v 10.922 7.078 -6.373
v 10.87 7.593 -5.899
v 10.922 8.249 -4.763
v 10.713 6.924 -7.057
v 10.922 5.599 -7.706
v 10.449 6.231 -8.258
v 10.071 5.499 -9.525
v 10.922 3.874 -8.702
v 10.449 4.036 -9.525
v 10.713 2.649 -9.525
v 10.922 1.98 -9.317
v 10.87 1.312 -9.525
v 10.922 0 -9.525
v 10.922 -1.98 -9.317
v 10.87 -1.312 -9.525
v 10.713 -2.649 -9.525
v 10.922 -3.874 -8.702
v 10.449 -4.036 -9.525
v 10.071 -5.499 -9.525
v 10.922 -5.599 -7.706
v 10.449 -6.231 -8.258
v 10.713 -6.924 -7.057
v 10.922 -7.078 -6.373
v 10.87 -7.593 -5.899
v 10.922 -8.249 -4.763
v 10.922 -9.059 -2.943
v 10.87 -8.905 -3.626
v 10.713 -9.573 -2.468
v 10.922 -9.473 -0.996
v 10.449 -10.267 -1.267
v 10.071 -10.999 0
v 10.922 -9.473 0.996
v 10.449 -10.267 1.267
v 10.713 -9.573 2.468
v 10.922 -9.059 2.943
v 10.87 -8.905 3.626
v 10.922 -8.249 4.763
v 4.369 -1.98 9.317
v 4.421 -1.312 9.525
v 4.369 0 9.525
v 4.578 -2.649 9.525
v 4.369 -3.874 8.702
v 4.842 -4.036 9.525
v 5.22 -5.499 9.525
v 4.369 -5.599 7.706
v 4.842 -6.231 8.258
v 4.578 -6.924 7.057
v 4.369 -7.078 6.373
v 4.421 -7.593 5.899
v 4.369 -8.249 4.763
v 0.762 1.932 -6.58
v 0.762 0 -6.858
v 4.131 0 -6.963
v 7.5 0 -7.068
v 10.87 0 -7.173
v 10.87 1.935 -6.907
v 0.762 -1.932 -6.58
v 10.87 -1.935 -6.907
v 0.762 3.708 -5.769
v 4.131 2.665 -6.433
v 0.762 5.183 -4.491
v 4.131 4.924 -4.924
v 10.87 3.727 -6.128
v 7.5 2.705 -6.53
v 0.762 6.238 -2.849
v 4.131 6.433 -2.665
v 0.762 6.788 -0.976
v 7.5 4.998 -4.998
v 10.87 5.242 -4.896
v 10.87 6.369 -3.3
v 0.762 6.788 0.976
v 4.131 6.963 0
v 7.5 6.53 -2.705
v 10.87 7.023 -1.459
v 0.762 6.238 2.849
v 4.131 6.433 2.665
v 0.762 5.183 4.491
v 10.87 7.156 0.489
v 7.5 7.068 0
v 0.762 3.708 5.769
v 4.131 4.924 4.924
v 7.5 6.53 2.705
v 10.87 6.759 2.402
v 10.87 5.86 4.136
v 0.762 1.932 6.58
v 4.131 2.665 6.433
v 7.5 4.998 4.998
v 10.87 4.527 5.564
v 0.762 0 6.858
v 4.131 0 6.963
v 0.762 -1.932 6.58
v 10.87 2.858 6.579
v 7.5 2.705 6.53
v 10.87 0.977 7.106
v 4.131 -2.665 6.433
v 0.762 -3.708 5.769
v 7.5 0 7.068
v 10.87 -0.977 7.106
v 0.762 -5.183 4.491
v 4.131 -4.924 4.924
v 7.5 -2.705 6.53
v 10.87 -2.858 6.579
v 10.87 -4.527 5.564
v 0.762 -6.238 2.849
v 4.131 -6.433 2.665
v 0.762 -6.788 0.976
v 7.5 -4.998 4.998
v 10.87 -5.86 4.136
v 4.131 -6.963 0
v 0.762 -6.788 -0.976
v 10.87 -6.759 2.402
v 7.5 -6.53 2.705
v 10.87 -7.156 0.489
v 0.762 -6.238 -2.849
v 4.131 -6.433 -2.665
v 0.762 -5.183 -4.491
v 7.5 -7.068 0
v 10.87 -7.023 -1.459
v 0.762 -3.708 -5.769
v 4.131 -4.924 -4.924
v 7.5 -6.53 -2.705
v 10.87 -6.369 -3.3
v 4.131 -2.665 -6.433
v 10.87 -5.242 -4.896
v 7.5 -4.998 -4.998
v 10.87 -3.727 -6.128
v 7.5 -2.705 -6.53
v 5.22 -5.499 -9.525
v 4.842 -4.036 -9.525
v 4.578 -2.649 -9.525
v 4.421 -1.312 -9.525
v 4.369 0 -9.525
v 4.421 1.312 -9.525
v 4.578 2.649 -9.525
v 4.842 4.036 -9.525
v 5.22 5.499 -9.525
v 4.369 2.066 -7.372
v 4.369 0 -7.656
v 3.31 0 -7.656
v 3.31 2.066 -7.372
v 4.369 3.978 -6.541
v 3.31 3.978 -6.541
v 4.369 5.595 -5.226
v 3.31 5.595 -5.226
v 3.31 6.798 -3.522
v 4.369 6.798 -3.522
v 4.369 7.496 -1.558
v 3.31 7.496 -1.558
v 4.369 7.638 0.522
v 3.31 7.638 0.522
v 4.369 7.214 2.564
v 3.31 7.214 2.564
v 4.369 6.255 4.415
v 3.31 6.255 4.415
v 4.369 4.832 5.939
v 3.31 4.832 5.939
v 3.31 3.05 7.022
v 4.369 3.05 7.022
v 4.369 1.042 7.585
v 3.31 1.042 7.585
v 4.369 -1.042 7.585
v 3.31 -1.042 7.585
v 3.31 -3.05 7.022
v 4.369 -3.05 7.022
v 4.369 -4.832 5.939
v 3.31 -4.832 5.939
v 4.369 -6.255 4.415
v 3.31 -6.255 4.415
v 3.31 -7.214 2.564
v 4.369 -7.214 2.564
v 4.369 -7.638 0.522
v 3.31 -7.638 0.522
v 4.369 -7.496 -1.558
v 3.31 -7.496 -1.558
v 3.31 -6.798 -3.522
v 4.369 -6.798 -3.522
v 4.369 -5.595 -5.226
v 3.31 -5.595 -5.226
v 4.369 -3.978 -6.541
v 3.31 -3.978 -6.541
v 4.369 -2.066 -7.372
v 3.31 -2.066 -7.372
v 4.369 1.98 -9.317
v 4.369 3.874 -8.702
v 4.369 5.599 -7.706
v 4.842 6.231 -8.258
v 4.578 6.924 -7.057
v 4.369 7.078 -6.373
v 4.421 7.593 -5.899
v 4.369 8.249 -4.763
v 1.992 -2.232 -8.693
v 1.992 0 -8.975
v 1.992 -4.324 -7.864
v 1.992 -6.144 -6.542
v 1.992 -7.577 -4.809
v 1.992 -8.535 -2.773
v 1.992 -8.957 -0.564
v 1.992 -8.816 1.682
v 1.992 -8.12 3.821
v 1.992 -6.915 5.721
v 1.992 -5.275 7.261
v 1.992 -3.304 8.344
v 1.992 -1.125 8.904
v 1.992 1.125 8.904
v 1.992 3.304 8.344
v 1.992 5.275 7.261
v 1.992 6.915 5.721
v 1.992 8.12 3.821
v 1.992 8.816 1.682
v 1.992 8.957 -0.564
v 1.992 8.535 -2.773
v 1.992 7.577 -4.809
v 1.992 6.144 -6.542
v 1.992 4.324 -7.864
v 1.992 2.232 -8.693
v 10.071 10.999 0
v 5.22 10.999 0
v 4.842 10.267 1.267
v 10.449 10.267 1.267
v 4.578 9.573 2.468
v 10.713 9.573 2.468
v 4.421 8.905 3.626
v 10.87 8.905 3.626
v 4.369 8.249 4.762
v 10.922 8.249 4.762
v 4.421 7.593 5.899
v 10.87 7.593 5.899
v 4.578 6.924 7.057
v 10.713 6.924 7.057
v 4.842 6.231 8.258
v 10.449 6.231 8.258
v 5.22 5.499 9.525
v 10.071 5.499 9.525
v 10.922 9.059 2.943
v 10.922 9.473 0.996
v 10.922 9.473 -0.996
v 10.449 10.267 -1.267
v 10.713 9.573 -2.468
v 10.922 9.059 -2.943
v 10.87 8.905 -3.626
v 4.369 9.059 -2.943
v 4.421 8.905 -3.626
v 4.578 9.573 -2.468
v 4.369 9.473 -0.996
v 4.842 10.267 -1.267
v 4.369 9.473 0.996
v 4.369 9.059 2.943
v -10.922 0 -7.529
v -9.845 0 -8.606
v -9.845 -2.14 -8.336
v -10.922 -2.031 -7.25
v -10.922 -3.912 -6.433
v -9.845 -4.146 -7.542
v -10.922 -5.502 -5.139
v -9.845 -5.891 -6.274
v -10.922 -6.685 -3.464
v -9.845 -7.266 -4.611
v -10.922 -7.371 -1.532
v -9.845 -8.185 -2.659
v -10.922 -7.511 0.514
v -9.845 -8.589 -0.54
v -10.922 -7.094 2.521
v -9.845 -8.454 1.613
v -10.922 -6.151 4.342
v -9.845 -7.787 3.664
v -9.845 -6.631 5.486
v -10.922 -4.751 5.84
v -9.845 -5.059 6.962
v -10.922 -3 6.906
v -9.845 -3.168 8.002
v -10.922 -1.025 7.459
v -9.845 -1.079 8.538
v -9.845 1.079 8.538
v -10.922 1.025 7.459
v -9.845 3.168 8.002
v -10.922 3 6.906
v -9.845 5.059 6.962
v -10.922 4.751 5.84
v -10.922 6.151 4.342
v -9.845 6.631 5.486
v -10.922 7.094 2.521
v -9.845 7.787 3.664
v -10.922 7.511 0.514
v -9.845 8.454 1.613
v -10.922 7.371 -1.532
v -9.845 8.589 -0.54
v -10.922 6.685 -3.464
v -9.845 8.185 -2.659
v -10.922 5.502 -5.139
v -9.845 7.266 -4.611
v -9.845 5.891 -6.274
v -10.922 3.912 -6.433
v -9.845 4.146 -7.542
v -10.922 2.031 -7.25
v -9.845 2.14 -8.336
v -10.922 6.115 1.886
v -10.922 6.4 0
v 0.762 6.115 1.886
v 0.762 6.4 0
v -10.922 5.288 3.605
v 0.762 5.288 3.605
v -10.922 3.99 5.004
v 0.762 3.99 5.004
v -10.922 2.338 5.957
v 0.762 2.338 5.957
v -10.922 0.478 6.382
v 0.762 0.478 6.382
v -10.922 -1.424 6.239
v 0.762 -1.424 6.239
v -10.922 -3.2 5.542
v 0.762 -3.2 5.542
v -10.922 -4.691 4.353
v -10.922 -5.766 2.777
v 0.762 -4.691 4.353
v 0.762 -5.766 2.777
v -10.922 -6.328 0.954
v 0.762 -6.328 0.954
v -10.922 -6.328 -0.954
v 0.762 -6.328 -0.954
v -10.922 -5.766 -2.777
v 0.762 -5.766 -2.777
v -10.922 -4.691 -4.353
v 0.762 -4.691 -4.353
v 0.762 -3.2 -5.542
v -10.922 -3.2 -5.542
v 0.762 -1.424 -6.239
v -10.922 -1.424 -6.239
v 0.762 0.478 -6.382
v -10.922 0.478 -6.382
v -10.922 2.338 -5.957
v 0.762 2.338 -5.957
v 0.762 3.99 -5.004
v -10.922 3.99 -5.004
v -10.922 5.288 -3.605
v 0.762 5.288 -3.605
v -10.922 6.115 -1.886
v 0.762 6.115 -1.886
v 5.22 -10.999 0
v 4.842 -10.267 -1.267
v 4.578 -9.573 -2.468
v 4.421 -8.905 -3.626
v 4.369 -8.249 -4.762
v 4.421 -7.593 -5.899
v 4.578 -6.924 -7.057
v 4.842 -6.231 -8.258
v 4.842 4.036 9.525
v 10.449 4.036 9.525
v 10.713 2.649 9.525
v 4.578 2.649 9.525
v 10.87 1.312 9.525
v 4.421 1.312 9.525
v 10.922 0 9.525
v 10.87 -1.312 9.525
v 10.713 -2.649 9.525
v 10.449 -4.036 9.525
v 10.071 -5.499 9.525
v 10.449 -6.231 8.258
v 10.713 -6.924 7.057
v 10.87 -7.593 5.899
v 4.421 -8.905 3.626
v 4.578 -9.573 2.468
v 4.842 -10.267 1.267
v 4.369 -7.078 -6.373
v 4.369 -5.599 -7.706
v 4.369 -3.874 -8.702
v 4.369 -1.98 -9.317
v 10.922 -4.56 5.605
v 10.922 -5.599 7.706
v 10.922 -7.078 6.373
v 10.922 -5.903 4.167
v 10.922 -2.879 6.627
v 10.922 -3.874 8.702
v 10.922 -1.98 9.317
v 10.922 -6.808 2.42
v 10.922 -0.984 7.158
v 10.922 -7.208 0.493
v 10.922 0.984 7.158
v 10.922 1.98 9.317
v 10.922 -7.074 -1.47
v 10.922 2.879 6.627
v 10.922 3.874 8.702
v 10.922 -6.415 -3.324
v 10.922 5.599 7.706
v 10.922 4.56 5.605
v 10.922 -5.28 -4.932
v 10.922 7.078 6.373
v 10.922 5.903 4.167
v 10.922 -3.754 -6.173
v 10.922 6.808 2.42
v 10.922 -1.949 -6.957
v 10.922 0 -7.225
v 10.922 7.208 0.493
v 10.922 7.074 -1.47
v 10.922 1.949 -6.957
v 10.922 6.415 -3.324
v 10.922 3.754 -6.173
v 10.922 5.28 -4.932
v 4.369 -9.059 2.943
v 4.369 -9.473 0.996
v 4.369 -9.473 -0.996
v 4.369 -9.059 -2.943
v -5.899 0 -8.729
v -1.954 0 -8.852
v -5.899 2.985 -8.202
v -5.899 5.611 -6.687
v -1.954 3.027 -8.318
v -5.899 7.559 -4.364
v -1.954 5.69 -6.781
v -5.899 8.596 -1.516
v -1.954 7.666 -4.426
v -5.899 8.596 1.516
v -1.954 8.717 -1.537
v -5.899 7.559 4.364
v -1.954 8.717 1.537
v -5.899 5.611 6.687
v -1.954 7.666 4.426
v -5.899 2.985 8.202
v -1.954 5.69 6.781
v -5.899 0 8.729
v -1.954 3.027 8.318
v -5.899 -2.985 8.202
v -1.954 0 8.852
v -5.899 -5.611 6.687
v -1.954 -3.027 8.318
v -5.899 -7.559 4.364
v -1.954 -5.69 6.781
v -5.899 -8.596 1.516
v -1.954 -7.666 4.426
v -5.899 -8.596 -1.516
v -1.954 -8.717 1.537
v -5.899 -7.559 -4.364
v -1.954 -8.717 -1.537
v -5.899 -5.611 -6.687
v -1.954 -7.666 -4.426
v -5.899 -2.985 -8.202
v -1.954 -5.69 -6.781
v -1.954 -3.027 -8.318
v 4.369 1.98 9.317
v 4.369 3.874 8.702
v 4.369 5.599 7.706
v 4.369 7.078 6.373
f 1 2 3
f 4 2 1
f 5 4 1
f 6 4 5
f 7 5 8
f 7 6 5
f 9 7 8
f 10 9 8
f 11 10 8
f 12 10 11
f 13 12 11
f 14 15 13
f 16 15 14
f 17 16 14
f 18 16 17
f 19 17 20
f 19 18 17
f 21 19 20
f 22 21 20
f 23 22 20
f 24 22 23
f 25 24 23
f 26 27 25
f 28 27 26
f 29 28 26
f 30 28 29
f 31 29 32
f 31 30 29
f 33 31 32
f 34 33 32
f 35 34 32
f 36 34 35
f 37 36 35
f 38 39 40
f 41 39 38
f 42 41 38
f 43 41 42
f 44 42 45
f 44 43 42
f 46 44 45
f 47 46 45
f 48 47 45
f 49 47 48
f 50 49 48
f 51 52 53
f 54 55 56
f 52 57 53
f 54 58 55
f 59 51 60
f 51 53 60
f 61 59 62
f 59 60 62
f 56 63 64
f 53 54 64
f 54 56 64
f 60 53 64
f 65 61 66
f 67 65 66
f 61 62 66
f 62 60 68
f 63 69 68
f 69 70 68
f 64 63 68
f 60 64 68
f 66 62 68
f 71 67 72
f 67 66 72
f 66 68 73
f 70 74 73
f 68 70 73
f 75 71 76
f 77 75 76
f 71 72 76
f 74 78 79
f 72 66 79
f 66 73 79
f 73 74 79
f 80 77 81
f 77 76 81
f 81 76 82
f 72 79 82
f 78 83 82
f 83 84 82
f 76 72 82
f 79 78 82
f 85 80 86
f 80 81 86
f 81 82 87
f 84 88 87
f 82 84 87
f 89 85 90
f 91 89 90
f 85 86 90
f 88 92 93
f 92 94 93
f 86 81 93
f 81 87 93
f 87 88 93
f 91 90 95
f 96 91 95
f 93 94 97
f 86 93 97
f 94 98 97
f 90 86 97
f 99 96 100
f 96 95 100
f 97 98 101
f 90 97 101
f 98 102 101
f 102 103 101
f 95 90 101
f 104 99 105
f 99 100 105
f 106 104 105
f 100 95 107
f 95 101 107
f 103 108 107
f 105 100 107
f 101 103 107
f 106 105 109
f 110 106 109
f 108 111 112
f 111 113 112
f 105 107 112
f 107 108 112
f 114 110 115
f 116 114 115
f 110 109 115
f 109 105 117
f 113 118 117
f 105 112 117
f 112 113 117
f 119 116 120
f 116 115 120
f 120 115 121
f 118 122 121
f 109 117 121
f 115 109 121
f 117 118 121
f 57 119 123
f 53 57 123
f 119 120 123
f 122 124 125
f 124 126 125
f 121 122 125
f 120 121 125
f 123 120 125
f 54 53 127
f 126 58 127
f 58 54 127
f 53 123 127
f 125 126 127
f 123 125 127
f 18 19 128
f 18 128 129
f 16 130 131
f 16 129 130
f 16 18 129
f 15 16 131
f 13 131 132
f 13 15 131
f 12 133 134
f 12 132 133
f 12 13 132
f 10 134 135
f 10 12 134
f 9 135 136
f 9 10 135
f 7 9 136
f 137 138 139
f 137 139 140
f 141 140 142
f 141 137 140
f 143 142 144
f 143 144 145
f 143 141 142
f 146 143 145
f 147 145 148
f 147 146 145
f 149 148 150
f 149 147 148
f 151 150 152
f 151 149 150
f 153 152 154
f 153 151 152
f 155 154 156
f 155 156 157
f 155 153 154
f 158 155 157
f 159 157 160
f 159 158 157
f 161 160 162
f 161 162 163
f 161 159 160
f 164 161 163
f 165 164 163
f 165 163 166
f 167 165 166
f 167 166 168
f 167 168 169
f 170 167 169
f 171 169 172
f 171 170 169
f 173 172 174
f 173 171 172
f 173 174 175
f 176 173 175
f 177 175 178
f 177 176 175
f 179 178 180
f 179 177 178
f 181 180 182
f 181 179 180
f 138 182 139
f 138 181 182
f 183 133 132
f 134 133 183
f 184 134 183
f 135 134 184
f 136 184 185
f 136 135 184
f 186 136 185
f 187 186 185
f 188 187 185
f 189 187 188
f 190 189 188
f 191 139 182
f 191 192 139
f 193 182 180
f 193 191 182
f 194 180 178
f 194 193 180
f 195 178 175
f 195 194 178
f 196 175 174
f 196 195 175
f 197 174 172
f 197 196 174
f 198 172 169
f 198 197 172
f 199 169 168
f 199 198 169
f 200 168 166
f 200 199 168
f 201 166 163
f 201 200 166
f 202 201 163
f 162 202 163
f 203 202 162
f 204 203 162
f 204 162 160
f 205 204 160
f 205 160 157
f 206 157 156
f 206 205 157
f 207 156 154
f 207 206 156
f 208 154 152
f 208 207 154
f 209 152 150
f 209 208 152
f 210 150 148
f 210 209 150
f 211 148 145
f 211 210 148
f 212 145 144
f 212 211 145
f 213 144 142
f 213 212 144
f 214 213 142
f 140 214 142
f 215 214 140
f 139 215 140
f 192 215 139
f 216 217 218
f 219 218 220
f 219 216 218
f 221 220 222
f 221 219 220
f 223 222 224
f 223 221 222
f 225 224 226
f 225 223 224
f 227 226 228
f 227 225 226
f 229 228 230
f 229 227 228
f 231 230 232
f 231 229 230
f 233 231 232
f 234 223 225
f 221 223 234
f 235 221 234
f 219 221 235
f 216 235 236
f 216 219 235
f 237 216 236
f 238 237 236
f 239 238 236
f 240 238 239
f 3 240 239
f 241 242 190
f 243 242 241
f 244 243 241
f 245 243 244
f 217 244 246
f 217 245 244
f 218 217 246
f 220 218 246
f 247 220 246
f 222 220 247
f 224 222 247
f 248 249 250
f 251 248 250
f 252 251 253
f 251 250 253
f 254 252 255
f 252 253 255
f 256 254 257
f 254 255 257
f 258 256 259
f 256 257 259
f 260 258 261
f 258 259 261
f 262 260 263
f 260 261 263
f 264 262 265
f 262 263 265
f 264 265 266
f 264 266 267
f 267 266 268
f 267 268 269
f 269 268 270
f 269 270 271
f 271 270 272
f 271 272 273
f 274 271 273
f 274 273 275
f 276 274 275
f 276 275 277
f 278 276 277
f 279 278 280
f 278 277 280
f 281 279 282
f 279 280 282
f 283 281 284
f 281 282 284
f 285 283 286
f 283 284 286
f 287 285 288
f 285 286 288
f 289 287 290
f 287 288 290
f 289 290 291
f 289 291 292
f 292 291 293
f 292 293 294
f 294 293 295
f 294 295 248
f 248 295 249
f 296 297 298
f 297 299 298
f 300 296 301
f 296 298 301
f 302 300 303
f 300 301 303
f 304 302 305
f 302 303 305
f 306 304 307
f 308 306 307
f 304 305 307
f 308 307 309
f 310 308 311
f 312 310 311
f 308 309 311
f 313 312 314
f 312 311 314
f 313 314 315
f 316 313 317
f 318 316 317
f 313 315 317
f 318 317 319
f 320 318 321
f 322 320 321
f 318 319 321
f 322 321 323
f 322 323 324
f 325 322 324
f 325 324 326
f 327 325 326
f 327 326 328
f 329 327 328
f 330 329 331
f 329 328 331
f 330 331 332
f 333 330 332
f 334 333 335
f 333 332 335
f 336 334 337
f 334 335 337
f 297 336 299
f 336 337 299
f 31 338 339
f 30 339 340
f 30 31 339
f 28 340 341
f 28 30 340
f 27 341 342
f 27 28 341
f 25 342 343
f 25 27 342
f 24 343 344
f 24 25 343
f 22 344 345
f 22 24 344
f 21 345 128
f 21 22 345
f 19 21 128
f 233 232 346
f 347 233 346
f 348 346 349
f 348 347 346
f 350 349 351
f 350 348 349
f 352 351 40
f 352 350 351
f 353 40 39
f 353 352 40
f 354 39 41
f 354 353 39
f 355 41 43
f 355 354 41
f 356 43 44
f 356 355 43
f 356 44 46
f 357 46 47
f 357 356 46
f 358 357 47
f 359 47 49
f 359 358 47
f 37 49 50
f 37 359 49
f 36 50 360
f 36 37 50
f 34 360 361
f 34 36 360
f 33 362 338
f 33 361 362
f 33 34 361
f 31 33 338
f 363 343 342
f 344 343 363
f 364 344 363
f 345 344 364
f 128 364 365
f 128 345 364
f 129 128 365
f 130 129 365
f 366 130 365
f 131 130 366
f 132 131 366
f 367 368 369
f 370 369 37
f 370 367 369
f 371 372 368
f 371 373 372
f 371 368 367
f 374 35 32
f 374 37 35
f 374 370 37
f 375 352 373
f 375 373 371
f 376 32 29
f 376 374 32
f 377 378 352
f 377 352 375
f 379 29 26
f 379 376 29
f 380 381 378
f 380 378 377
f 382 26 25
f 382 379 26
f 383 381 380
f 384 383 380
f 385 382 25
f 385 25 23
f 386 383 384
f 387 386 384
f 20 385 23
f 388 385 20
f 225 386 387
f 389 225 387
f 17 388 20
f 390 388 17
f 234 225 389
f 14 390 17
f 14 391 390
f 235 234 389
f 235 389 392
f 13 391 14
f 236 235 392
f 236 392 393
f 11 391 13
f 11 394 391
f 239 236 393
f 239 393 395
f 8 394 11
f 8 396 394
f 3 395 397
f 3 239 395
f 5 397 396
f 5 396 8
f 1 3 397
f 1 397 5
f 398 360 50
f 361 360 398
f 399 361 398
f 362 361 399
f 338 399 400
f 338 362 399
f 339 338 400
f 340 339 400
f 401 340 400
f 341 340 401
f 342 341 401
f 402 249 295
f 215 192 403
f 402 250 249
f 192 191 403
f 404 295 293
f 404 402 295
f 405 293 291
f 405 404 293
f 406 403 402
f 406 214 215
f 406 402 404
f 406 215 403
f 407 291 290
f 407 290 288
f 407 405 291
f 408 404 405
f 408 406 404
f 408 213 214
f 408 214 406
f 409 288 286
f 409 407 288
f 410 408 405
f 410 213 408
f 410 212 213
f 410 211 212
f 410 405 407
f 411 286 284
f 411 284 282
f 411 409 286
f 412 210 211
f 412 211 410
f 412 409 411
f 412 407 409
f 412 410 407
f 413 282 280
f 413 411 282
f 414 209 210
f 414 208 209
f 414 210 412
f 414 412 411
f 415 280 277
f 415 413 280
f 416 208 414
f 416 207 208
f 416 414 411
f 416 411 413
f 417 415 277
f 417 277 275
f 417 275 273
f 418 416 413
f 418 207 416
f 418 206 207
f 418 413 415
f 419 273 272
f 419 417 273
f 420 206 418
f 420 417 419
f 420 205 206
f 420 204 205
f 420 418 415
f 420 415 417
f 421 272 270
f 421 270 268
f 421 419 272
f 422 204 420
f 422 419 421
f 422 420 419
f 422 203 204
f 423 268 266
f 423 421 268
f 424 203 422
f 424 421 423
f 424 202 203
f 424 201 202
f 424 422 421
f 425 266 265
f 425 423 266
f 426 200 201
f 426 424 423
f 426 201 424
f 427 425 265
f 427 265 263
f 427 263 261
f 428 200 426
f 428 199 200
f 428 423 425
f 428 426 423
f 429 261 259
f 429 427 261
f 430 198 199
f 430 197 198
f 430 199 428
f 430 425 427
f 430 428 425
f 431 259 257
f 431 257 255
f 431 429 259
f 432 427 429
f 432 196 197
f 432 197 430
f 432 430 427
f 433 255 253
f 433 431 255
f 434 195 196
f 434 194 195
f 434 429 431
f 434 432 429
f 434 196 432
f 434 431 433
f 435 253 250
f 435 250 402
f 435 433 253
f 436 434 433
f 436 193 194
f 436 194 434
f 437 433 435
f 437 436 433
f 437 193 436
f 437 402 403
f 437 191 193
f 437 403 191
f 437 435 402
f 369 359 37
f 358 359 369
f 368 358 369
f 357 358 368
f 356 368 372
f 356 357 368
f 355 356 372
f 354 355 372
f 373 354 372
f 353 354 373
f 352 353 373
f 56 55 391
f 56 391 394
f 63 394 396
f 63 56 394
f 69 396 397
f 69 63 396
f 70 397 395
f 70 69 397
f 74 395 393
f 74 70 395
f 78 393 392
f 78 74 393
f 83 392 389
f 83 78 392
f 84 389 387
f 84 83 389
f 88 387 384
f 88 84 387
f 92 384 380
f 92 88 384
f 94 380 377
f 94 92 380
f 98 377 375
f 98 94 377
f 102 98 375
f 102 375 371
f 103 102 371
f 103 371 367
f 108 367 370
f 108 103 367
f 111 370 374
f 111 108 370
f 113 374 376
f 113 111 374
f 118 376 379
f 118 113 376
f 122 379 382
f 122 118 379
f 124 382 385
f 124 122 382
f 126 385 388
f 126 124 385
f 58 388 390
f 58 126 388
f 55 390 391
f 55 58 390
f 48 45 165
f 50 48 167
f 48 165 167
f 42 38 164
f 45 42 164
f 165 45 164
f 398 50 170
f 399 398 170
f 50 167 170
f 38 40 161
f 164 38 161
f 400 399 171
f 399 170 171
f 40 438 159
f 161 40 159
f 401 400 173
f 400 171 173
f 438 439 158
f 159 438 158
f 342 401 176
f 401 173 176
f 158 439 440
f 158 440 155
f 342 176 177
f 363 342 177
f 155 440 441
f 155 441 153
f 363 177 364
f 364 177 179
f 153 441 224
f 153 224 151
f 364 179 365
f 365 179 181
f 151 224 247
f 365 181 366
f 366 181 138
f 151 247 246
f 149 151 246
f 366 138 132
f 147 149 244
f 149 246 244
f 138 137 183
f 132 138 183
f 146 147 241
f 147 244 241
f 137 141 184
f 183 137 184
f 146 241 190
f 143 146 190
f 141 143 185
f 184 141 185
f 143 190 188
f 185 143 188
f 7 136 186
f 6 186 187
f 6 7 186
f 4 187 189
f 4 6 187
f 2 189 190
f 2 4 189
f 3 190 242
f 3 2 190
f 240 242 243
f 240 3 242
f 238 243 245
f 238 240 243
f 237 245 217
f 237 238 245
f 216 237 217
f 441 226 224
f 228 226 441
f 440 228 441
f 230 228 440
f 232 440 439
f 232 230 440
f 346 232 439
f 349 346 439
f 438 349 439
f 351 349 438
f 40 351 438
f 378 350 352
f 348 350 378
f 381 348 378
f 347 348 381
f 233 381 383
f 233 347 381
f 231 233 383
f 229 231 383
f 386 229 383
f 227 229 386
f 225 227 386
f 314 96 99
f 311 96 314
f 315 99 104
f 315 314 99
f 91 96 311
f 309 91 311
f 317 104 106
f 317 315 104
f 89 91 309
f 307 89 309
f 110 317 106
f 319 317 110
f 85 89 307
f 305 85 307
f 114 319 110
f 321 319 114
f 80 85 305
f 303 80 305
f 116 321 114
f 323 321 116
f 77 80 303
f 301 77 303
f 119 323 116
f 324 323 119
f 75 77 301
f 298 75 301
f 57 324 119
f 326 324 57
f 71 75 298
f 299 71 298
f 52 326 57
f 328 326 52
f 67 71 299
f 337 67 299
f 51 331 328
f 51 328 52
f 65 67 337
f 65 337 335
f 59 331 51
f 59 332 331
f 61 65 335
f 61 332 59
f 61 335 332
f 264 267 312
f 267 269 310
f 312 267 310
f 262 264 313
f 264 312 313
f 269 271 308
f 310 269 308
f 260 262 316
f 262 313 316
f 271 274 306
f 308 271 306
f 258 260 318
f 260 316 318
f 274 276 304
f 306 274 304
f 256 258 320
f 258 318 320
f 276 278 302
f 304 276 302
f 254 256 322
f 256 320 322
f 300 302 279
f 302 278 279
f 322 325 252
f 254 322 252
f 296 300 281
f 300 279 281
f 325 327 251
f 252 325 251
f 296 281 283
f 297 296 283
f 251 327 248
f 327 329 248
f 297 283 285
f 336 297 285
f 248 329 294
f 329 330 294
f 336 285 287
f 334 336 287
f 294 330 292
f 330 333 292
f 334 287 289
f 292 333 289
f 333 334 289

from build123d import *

# Parameters (mm, degrees)
SKETCH2_R          = 8.5725
EXTRUDE1_DEPTH     = 21.844
EXTRUDE1_TAPER     = -1.783333333
SKETCH5_OUTSIDE_W  = 73.012
SKETCH5_OUTSIDE_H  = 73.012
SKETCH5_OUTSIDE_R  = 7.528956448
CUT_EXTRUDE1_DEPTH = 22.8440001
CUT_EXTRUDE1_TAPER = 45
SKETCH8_R          = 14.9225
CUT_EXTRUDE4_DEPTH = 7.5532001
SKETCH9_OUTSIDE_W  = 26.06
SKETCH9_OUTSIDE_H  = 26.06
SKETCH9_OUTSIDE_R  = 7.655956448
CUT_EXTRUDE5_DEPTH = 1.058333333
SKETCH10_OUTSIDE_W = 56.444
SKETCH10_OUTSIDE_H = 56.444
SKETCH10_OUTSIDE_R = 7.655956448
CUT_EXTRUDE6_DEPTH = 15.232466767
CUT_EXTRUDE6_TAPER = 45
EXTRUDE2_DEPTH     = 6.5532
SKETCH7_OUTSIDE_W  = 107.462
SKETCH7_OUTSIDE_H  = 110.41
SKETCH7_OUTSIDE_R  = 9.525
CUT_EXTRUDE2_DEPTH = 22.8440001
CUT_EXTRUDE2_TAPER = 60
SKETCH18_OUTSIDE_W = 62.968
SKETCH18_OUTSIDE_H = 65.916
SKETCH18_OUTSIDE_R = 9.525
EXTRUDE3_DEPTH     = 10
EXTRUDE3_TAPER     = 60
SKETCH11_R         = 6.858
CUT_EXTRUDE7_DEPTH = 11.16
CUT_EXTRUDE7_TAPER = -1.783333333
SKETCH16_R         = 7.225132547
CUT_EXTRUDE9_DEPTH = 6.35
CUT_EXTRUDE9_TAPER = 45
SKETCH17_W         = 11.684
SKETCH17_H         = 6.399728224


with BuildPart() as part:
    # Sketch2 → Extrude1 (new body)
    with BuildSketch(Plane(origin=(-10.922, 0, 0), x_dir=(0, 0, -1), z_dir=(1, 0, 0))):
        Circle(SKETCH2_R)
    extrude(amount=EXTRUDE1_DEPTH, taper=EXTRUDE1_TAPER)

    # Sketch5 outside → Cut-Extrude1 (cut, through all)
    with BuildSketch(Plane(origin=(-10.922, 0, 0), x_dir=(0, 0, -1), z_dir=(1, 0, 0))):
        Rectangle(SKETCH5_OUTSIDE_W, SKETCH5_OUTSIDE_H)
        Circle(SKETCH5_OUTSIDE_R, mode=Mode.SUBTRACT)
    extrude(amount=CUT_EXTRUDE1_DEPTH, taper=CUT_EXTRUDE1_TAPER, mode=Mode.SUBTRACT)

    # Sketch8 → Cut-Extrude4 (cut, through all)
    with BuildSketch(Plane(origin=(4.3688, 0, 0), x_dir=(0, 0, -1), z_dir=(1, 0, 0))):
        Circle(SKETCH8_R)
    extrude(amount=CUT_EXTRUDE4_DEPTH, mode=Mode.SUBTRACT)

    # Sketch9 outside → Cut-Extrude5 (cut)
    with BuildSketch(Plane(origin=(4.3688, 0, 0), x_dir=(0, 0, -1), z_dir=(1, 0, 0))):
        Rectangle(SKETCH9_OUTSIDE_W, SKETCH9_OUTSIDE_H)
        Circle(SKETCH9_OUTSIDE_R, mode=Mode.SUBTRACT)
    extrude(amount=-CUT_EXTRUDE5_DEPTH, mode=Mode.SUBTRACT)

    # Sketch10 outside → Cut-Extrude6 (cut, through all)
    with BuildSketch(Plane(origin=(3.310466667, 0, 0), x_dir=(0, 0, -1), z_dir=(1, 0, 0))):
        Rectangle(SKETCH10_OUTSIDE_W, SKETCH10_OUTSIDE_H)
        Circle(SKETCH10_OUTSIDE_R, mode=Mode.SUBTRACT)
    extrude(amount=-CUT_EXTRUDE6_DEPTH, taper=CUT_EXTRUDE6_TAPER, mode=Mode.SUBTRACT)

    # Sketch6 → Extrude2 (add)
    with BuildSketch(Plane(origin=(10.922, 0, 0), x_dir=(0, 0, -1), z_dir=(1, 0, 0))):
        Polygon((0, 10.998522628), (-9.525, 5.499261314), (-9.525, -5.499261314), (0, -10.998522628), (9.525, -5.499261314), (9.525, 5.499261314), align=None)
    extrude(amount=-EXTRUDE2_DEPTH)

    # Sketch7 outside → Cut-Extrude2 (cut, through all)
    with BuildSketch(Plane(origin=(10.922, 0, 0), x_dir=(0, 0, -1), z_dir=(1, 0, 0))):
        Rectangle(SKETCH7_OUTSIDE_W, SKETCH7_OUTSIDE_H)
        Circle(SKETCH7_OUTSIDE_R, mode=Mode.SUBTRACT)
    extrude(amount=-CUT_EXTRUDE2_DEPTH, taper=CUT_EXTRUDE2_TAPER, mode=Mode.SUBTRACT)

    # Sketch18 outside → Extrude3 (cut)
    with BuildSketch(Plane.ZY.offset(-4.3688)):
        Rectangle(SKETCH18_OUTSIDE_W, SKETCH18_OUTSIDE_H)
        Circle(SKETCH18_OUTSIDE_R, mode=Mode.SUBTRACT)
    extrude(amount=-EXTRUDE3_DEPTH, taper=EXTRUDE3_TAPER, mode=Mode.SUBTRACT)

    # Sketch11 → Cut-Extrude7 (cut, through all)
    with BuildSketch(Plane(origin=(0.762, 0, 0), x_dir=(0, 0, -1), z_dir=(1, 0, 0))):
        Circle(SKETCH11_R)
    extrude(amount=CUT_EXTRUDE7_DEPTH, taper=CUT_EXTRUDE7_TAPER, mode=Mode.SUBTRACT)

    # Sketch16 → Cut-Extrude9 (cut)
    with BuildSketch(Plane(origin=(10.922, 0, 0), x_dir=(0, 0, -1), z_dir=(1, 0, 0))):
        Circle(SKETCH16_R)
    extrude(amount=-CUT_EXTRUDE9_DEPTH, taper=CUT_EXTRUDE9_TAPER, mode=Mode.SUBTRACT)

    # Sketch17 → Cut-Revolve1 (revolve, cut)
    with BuildSketch(Plane.XY):
        with Locations((-5.08, 3.199864112)):
            Rectangle(SKETCH17_W, SKETCH17_H)
    revolve(axis=Axis((-10.922, 0, 0), (1, 0, 0)), mode=Mode.SUBTRACT)


solid = part.part
